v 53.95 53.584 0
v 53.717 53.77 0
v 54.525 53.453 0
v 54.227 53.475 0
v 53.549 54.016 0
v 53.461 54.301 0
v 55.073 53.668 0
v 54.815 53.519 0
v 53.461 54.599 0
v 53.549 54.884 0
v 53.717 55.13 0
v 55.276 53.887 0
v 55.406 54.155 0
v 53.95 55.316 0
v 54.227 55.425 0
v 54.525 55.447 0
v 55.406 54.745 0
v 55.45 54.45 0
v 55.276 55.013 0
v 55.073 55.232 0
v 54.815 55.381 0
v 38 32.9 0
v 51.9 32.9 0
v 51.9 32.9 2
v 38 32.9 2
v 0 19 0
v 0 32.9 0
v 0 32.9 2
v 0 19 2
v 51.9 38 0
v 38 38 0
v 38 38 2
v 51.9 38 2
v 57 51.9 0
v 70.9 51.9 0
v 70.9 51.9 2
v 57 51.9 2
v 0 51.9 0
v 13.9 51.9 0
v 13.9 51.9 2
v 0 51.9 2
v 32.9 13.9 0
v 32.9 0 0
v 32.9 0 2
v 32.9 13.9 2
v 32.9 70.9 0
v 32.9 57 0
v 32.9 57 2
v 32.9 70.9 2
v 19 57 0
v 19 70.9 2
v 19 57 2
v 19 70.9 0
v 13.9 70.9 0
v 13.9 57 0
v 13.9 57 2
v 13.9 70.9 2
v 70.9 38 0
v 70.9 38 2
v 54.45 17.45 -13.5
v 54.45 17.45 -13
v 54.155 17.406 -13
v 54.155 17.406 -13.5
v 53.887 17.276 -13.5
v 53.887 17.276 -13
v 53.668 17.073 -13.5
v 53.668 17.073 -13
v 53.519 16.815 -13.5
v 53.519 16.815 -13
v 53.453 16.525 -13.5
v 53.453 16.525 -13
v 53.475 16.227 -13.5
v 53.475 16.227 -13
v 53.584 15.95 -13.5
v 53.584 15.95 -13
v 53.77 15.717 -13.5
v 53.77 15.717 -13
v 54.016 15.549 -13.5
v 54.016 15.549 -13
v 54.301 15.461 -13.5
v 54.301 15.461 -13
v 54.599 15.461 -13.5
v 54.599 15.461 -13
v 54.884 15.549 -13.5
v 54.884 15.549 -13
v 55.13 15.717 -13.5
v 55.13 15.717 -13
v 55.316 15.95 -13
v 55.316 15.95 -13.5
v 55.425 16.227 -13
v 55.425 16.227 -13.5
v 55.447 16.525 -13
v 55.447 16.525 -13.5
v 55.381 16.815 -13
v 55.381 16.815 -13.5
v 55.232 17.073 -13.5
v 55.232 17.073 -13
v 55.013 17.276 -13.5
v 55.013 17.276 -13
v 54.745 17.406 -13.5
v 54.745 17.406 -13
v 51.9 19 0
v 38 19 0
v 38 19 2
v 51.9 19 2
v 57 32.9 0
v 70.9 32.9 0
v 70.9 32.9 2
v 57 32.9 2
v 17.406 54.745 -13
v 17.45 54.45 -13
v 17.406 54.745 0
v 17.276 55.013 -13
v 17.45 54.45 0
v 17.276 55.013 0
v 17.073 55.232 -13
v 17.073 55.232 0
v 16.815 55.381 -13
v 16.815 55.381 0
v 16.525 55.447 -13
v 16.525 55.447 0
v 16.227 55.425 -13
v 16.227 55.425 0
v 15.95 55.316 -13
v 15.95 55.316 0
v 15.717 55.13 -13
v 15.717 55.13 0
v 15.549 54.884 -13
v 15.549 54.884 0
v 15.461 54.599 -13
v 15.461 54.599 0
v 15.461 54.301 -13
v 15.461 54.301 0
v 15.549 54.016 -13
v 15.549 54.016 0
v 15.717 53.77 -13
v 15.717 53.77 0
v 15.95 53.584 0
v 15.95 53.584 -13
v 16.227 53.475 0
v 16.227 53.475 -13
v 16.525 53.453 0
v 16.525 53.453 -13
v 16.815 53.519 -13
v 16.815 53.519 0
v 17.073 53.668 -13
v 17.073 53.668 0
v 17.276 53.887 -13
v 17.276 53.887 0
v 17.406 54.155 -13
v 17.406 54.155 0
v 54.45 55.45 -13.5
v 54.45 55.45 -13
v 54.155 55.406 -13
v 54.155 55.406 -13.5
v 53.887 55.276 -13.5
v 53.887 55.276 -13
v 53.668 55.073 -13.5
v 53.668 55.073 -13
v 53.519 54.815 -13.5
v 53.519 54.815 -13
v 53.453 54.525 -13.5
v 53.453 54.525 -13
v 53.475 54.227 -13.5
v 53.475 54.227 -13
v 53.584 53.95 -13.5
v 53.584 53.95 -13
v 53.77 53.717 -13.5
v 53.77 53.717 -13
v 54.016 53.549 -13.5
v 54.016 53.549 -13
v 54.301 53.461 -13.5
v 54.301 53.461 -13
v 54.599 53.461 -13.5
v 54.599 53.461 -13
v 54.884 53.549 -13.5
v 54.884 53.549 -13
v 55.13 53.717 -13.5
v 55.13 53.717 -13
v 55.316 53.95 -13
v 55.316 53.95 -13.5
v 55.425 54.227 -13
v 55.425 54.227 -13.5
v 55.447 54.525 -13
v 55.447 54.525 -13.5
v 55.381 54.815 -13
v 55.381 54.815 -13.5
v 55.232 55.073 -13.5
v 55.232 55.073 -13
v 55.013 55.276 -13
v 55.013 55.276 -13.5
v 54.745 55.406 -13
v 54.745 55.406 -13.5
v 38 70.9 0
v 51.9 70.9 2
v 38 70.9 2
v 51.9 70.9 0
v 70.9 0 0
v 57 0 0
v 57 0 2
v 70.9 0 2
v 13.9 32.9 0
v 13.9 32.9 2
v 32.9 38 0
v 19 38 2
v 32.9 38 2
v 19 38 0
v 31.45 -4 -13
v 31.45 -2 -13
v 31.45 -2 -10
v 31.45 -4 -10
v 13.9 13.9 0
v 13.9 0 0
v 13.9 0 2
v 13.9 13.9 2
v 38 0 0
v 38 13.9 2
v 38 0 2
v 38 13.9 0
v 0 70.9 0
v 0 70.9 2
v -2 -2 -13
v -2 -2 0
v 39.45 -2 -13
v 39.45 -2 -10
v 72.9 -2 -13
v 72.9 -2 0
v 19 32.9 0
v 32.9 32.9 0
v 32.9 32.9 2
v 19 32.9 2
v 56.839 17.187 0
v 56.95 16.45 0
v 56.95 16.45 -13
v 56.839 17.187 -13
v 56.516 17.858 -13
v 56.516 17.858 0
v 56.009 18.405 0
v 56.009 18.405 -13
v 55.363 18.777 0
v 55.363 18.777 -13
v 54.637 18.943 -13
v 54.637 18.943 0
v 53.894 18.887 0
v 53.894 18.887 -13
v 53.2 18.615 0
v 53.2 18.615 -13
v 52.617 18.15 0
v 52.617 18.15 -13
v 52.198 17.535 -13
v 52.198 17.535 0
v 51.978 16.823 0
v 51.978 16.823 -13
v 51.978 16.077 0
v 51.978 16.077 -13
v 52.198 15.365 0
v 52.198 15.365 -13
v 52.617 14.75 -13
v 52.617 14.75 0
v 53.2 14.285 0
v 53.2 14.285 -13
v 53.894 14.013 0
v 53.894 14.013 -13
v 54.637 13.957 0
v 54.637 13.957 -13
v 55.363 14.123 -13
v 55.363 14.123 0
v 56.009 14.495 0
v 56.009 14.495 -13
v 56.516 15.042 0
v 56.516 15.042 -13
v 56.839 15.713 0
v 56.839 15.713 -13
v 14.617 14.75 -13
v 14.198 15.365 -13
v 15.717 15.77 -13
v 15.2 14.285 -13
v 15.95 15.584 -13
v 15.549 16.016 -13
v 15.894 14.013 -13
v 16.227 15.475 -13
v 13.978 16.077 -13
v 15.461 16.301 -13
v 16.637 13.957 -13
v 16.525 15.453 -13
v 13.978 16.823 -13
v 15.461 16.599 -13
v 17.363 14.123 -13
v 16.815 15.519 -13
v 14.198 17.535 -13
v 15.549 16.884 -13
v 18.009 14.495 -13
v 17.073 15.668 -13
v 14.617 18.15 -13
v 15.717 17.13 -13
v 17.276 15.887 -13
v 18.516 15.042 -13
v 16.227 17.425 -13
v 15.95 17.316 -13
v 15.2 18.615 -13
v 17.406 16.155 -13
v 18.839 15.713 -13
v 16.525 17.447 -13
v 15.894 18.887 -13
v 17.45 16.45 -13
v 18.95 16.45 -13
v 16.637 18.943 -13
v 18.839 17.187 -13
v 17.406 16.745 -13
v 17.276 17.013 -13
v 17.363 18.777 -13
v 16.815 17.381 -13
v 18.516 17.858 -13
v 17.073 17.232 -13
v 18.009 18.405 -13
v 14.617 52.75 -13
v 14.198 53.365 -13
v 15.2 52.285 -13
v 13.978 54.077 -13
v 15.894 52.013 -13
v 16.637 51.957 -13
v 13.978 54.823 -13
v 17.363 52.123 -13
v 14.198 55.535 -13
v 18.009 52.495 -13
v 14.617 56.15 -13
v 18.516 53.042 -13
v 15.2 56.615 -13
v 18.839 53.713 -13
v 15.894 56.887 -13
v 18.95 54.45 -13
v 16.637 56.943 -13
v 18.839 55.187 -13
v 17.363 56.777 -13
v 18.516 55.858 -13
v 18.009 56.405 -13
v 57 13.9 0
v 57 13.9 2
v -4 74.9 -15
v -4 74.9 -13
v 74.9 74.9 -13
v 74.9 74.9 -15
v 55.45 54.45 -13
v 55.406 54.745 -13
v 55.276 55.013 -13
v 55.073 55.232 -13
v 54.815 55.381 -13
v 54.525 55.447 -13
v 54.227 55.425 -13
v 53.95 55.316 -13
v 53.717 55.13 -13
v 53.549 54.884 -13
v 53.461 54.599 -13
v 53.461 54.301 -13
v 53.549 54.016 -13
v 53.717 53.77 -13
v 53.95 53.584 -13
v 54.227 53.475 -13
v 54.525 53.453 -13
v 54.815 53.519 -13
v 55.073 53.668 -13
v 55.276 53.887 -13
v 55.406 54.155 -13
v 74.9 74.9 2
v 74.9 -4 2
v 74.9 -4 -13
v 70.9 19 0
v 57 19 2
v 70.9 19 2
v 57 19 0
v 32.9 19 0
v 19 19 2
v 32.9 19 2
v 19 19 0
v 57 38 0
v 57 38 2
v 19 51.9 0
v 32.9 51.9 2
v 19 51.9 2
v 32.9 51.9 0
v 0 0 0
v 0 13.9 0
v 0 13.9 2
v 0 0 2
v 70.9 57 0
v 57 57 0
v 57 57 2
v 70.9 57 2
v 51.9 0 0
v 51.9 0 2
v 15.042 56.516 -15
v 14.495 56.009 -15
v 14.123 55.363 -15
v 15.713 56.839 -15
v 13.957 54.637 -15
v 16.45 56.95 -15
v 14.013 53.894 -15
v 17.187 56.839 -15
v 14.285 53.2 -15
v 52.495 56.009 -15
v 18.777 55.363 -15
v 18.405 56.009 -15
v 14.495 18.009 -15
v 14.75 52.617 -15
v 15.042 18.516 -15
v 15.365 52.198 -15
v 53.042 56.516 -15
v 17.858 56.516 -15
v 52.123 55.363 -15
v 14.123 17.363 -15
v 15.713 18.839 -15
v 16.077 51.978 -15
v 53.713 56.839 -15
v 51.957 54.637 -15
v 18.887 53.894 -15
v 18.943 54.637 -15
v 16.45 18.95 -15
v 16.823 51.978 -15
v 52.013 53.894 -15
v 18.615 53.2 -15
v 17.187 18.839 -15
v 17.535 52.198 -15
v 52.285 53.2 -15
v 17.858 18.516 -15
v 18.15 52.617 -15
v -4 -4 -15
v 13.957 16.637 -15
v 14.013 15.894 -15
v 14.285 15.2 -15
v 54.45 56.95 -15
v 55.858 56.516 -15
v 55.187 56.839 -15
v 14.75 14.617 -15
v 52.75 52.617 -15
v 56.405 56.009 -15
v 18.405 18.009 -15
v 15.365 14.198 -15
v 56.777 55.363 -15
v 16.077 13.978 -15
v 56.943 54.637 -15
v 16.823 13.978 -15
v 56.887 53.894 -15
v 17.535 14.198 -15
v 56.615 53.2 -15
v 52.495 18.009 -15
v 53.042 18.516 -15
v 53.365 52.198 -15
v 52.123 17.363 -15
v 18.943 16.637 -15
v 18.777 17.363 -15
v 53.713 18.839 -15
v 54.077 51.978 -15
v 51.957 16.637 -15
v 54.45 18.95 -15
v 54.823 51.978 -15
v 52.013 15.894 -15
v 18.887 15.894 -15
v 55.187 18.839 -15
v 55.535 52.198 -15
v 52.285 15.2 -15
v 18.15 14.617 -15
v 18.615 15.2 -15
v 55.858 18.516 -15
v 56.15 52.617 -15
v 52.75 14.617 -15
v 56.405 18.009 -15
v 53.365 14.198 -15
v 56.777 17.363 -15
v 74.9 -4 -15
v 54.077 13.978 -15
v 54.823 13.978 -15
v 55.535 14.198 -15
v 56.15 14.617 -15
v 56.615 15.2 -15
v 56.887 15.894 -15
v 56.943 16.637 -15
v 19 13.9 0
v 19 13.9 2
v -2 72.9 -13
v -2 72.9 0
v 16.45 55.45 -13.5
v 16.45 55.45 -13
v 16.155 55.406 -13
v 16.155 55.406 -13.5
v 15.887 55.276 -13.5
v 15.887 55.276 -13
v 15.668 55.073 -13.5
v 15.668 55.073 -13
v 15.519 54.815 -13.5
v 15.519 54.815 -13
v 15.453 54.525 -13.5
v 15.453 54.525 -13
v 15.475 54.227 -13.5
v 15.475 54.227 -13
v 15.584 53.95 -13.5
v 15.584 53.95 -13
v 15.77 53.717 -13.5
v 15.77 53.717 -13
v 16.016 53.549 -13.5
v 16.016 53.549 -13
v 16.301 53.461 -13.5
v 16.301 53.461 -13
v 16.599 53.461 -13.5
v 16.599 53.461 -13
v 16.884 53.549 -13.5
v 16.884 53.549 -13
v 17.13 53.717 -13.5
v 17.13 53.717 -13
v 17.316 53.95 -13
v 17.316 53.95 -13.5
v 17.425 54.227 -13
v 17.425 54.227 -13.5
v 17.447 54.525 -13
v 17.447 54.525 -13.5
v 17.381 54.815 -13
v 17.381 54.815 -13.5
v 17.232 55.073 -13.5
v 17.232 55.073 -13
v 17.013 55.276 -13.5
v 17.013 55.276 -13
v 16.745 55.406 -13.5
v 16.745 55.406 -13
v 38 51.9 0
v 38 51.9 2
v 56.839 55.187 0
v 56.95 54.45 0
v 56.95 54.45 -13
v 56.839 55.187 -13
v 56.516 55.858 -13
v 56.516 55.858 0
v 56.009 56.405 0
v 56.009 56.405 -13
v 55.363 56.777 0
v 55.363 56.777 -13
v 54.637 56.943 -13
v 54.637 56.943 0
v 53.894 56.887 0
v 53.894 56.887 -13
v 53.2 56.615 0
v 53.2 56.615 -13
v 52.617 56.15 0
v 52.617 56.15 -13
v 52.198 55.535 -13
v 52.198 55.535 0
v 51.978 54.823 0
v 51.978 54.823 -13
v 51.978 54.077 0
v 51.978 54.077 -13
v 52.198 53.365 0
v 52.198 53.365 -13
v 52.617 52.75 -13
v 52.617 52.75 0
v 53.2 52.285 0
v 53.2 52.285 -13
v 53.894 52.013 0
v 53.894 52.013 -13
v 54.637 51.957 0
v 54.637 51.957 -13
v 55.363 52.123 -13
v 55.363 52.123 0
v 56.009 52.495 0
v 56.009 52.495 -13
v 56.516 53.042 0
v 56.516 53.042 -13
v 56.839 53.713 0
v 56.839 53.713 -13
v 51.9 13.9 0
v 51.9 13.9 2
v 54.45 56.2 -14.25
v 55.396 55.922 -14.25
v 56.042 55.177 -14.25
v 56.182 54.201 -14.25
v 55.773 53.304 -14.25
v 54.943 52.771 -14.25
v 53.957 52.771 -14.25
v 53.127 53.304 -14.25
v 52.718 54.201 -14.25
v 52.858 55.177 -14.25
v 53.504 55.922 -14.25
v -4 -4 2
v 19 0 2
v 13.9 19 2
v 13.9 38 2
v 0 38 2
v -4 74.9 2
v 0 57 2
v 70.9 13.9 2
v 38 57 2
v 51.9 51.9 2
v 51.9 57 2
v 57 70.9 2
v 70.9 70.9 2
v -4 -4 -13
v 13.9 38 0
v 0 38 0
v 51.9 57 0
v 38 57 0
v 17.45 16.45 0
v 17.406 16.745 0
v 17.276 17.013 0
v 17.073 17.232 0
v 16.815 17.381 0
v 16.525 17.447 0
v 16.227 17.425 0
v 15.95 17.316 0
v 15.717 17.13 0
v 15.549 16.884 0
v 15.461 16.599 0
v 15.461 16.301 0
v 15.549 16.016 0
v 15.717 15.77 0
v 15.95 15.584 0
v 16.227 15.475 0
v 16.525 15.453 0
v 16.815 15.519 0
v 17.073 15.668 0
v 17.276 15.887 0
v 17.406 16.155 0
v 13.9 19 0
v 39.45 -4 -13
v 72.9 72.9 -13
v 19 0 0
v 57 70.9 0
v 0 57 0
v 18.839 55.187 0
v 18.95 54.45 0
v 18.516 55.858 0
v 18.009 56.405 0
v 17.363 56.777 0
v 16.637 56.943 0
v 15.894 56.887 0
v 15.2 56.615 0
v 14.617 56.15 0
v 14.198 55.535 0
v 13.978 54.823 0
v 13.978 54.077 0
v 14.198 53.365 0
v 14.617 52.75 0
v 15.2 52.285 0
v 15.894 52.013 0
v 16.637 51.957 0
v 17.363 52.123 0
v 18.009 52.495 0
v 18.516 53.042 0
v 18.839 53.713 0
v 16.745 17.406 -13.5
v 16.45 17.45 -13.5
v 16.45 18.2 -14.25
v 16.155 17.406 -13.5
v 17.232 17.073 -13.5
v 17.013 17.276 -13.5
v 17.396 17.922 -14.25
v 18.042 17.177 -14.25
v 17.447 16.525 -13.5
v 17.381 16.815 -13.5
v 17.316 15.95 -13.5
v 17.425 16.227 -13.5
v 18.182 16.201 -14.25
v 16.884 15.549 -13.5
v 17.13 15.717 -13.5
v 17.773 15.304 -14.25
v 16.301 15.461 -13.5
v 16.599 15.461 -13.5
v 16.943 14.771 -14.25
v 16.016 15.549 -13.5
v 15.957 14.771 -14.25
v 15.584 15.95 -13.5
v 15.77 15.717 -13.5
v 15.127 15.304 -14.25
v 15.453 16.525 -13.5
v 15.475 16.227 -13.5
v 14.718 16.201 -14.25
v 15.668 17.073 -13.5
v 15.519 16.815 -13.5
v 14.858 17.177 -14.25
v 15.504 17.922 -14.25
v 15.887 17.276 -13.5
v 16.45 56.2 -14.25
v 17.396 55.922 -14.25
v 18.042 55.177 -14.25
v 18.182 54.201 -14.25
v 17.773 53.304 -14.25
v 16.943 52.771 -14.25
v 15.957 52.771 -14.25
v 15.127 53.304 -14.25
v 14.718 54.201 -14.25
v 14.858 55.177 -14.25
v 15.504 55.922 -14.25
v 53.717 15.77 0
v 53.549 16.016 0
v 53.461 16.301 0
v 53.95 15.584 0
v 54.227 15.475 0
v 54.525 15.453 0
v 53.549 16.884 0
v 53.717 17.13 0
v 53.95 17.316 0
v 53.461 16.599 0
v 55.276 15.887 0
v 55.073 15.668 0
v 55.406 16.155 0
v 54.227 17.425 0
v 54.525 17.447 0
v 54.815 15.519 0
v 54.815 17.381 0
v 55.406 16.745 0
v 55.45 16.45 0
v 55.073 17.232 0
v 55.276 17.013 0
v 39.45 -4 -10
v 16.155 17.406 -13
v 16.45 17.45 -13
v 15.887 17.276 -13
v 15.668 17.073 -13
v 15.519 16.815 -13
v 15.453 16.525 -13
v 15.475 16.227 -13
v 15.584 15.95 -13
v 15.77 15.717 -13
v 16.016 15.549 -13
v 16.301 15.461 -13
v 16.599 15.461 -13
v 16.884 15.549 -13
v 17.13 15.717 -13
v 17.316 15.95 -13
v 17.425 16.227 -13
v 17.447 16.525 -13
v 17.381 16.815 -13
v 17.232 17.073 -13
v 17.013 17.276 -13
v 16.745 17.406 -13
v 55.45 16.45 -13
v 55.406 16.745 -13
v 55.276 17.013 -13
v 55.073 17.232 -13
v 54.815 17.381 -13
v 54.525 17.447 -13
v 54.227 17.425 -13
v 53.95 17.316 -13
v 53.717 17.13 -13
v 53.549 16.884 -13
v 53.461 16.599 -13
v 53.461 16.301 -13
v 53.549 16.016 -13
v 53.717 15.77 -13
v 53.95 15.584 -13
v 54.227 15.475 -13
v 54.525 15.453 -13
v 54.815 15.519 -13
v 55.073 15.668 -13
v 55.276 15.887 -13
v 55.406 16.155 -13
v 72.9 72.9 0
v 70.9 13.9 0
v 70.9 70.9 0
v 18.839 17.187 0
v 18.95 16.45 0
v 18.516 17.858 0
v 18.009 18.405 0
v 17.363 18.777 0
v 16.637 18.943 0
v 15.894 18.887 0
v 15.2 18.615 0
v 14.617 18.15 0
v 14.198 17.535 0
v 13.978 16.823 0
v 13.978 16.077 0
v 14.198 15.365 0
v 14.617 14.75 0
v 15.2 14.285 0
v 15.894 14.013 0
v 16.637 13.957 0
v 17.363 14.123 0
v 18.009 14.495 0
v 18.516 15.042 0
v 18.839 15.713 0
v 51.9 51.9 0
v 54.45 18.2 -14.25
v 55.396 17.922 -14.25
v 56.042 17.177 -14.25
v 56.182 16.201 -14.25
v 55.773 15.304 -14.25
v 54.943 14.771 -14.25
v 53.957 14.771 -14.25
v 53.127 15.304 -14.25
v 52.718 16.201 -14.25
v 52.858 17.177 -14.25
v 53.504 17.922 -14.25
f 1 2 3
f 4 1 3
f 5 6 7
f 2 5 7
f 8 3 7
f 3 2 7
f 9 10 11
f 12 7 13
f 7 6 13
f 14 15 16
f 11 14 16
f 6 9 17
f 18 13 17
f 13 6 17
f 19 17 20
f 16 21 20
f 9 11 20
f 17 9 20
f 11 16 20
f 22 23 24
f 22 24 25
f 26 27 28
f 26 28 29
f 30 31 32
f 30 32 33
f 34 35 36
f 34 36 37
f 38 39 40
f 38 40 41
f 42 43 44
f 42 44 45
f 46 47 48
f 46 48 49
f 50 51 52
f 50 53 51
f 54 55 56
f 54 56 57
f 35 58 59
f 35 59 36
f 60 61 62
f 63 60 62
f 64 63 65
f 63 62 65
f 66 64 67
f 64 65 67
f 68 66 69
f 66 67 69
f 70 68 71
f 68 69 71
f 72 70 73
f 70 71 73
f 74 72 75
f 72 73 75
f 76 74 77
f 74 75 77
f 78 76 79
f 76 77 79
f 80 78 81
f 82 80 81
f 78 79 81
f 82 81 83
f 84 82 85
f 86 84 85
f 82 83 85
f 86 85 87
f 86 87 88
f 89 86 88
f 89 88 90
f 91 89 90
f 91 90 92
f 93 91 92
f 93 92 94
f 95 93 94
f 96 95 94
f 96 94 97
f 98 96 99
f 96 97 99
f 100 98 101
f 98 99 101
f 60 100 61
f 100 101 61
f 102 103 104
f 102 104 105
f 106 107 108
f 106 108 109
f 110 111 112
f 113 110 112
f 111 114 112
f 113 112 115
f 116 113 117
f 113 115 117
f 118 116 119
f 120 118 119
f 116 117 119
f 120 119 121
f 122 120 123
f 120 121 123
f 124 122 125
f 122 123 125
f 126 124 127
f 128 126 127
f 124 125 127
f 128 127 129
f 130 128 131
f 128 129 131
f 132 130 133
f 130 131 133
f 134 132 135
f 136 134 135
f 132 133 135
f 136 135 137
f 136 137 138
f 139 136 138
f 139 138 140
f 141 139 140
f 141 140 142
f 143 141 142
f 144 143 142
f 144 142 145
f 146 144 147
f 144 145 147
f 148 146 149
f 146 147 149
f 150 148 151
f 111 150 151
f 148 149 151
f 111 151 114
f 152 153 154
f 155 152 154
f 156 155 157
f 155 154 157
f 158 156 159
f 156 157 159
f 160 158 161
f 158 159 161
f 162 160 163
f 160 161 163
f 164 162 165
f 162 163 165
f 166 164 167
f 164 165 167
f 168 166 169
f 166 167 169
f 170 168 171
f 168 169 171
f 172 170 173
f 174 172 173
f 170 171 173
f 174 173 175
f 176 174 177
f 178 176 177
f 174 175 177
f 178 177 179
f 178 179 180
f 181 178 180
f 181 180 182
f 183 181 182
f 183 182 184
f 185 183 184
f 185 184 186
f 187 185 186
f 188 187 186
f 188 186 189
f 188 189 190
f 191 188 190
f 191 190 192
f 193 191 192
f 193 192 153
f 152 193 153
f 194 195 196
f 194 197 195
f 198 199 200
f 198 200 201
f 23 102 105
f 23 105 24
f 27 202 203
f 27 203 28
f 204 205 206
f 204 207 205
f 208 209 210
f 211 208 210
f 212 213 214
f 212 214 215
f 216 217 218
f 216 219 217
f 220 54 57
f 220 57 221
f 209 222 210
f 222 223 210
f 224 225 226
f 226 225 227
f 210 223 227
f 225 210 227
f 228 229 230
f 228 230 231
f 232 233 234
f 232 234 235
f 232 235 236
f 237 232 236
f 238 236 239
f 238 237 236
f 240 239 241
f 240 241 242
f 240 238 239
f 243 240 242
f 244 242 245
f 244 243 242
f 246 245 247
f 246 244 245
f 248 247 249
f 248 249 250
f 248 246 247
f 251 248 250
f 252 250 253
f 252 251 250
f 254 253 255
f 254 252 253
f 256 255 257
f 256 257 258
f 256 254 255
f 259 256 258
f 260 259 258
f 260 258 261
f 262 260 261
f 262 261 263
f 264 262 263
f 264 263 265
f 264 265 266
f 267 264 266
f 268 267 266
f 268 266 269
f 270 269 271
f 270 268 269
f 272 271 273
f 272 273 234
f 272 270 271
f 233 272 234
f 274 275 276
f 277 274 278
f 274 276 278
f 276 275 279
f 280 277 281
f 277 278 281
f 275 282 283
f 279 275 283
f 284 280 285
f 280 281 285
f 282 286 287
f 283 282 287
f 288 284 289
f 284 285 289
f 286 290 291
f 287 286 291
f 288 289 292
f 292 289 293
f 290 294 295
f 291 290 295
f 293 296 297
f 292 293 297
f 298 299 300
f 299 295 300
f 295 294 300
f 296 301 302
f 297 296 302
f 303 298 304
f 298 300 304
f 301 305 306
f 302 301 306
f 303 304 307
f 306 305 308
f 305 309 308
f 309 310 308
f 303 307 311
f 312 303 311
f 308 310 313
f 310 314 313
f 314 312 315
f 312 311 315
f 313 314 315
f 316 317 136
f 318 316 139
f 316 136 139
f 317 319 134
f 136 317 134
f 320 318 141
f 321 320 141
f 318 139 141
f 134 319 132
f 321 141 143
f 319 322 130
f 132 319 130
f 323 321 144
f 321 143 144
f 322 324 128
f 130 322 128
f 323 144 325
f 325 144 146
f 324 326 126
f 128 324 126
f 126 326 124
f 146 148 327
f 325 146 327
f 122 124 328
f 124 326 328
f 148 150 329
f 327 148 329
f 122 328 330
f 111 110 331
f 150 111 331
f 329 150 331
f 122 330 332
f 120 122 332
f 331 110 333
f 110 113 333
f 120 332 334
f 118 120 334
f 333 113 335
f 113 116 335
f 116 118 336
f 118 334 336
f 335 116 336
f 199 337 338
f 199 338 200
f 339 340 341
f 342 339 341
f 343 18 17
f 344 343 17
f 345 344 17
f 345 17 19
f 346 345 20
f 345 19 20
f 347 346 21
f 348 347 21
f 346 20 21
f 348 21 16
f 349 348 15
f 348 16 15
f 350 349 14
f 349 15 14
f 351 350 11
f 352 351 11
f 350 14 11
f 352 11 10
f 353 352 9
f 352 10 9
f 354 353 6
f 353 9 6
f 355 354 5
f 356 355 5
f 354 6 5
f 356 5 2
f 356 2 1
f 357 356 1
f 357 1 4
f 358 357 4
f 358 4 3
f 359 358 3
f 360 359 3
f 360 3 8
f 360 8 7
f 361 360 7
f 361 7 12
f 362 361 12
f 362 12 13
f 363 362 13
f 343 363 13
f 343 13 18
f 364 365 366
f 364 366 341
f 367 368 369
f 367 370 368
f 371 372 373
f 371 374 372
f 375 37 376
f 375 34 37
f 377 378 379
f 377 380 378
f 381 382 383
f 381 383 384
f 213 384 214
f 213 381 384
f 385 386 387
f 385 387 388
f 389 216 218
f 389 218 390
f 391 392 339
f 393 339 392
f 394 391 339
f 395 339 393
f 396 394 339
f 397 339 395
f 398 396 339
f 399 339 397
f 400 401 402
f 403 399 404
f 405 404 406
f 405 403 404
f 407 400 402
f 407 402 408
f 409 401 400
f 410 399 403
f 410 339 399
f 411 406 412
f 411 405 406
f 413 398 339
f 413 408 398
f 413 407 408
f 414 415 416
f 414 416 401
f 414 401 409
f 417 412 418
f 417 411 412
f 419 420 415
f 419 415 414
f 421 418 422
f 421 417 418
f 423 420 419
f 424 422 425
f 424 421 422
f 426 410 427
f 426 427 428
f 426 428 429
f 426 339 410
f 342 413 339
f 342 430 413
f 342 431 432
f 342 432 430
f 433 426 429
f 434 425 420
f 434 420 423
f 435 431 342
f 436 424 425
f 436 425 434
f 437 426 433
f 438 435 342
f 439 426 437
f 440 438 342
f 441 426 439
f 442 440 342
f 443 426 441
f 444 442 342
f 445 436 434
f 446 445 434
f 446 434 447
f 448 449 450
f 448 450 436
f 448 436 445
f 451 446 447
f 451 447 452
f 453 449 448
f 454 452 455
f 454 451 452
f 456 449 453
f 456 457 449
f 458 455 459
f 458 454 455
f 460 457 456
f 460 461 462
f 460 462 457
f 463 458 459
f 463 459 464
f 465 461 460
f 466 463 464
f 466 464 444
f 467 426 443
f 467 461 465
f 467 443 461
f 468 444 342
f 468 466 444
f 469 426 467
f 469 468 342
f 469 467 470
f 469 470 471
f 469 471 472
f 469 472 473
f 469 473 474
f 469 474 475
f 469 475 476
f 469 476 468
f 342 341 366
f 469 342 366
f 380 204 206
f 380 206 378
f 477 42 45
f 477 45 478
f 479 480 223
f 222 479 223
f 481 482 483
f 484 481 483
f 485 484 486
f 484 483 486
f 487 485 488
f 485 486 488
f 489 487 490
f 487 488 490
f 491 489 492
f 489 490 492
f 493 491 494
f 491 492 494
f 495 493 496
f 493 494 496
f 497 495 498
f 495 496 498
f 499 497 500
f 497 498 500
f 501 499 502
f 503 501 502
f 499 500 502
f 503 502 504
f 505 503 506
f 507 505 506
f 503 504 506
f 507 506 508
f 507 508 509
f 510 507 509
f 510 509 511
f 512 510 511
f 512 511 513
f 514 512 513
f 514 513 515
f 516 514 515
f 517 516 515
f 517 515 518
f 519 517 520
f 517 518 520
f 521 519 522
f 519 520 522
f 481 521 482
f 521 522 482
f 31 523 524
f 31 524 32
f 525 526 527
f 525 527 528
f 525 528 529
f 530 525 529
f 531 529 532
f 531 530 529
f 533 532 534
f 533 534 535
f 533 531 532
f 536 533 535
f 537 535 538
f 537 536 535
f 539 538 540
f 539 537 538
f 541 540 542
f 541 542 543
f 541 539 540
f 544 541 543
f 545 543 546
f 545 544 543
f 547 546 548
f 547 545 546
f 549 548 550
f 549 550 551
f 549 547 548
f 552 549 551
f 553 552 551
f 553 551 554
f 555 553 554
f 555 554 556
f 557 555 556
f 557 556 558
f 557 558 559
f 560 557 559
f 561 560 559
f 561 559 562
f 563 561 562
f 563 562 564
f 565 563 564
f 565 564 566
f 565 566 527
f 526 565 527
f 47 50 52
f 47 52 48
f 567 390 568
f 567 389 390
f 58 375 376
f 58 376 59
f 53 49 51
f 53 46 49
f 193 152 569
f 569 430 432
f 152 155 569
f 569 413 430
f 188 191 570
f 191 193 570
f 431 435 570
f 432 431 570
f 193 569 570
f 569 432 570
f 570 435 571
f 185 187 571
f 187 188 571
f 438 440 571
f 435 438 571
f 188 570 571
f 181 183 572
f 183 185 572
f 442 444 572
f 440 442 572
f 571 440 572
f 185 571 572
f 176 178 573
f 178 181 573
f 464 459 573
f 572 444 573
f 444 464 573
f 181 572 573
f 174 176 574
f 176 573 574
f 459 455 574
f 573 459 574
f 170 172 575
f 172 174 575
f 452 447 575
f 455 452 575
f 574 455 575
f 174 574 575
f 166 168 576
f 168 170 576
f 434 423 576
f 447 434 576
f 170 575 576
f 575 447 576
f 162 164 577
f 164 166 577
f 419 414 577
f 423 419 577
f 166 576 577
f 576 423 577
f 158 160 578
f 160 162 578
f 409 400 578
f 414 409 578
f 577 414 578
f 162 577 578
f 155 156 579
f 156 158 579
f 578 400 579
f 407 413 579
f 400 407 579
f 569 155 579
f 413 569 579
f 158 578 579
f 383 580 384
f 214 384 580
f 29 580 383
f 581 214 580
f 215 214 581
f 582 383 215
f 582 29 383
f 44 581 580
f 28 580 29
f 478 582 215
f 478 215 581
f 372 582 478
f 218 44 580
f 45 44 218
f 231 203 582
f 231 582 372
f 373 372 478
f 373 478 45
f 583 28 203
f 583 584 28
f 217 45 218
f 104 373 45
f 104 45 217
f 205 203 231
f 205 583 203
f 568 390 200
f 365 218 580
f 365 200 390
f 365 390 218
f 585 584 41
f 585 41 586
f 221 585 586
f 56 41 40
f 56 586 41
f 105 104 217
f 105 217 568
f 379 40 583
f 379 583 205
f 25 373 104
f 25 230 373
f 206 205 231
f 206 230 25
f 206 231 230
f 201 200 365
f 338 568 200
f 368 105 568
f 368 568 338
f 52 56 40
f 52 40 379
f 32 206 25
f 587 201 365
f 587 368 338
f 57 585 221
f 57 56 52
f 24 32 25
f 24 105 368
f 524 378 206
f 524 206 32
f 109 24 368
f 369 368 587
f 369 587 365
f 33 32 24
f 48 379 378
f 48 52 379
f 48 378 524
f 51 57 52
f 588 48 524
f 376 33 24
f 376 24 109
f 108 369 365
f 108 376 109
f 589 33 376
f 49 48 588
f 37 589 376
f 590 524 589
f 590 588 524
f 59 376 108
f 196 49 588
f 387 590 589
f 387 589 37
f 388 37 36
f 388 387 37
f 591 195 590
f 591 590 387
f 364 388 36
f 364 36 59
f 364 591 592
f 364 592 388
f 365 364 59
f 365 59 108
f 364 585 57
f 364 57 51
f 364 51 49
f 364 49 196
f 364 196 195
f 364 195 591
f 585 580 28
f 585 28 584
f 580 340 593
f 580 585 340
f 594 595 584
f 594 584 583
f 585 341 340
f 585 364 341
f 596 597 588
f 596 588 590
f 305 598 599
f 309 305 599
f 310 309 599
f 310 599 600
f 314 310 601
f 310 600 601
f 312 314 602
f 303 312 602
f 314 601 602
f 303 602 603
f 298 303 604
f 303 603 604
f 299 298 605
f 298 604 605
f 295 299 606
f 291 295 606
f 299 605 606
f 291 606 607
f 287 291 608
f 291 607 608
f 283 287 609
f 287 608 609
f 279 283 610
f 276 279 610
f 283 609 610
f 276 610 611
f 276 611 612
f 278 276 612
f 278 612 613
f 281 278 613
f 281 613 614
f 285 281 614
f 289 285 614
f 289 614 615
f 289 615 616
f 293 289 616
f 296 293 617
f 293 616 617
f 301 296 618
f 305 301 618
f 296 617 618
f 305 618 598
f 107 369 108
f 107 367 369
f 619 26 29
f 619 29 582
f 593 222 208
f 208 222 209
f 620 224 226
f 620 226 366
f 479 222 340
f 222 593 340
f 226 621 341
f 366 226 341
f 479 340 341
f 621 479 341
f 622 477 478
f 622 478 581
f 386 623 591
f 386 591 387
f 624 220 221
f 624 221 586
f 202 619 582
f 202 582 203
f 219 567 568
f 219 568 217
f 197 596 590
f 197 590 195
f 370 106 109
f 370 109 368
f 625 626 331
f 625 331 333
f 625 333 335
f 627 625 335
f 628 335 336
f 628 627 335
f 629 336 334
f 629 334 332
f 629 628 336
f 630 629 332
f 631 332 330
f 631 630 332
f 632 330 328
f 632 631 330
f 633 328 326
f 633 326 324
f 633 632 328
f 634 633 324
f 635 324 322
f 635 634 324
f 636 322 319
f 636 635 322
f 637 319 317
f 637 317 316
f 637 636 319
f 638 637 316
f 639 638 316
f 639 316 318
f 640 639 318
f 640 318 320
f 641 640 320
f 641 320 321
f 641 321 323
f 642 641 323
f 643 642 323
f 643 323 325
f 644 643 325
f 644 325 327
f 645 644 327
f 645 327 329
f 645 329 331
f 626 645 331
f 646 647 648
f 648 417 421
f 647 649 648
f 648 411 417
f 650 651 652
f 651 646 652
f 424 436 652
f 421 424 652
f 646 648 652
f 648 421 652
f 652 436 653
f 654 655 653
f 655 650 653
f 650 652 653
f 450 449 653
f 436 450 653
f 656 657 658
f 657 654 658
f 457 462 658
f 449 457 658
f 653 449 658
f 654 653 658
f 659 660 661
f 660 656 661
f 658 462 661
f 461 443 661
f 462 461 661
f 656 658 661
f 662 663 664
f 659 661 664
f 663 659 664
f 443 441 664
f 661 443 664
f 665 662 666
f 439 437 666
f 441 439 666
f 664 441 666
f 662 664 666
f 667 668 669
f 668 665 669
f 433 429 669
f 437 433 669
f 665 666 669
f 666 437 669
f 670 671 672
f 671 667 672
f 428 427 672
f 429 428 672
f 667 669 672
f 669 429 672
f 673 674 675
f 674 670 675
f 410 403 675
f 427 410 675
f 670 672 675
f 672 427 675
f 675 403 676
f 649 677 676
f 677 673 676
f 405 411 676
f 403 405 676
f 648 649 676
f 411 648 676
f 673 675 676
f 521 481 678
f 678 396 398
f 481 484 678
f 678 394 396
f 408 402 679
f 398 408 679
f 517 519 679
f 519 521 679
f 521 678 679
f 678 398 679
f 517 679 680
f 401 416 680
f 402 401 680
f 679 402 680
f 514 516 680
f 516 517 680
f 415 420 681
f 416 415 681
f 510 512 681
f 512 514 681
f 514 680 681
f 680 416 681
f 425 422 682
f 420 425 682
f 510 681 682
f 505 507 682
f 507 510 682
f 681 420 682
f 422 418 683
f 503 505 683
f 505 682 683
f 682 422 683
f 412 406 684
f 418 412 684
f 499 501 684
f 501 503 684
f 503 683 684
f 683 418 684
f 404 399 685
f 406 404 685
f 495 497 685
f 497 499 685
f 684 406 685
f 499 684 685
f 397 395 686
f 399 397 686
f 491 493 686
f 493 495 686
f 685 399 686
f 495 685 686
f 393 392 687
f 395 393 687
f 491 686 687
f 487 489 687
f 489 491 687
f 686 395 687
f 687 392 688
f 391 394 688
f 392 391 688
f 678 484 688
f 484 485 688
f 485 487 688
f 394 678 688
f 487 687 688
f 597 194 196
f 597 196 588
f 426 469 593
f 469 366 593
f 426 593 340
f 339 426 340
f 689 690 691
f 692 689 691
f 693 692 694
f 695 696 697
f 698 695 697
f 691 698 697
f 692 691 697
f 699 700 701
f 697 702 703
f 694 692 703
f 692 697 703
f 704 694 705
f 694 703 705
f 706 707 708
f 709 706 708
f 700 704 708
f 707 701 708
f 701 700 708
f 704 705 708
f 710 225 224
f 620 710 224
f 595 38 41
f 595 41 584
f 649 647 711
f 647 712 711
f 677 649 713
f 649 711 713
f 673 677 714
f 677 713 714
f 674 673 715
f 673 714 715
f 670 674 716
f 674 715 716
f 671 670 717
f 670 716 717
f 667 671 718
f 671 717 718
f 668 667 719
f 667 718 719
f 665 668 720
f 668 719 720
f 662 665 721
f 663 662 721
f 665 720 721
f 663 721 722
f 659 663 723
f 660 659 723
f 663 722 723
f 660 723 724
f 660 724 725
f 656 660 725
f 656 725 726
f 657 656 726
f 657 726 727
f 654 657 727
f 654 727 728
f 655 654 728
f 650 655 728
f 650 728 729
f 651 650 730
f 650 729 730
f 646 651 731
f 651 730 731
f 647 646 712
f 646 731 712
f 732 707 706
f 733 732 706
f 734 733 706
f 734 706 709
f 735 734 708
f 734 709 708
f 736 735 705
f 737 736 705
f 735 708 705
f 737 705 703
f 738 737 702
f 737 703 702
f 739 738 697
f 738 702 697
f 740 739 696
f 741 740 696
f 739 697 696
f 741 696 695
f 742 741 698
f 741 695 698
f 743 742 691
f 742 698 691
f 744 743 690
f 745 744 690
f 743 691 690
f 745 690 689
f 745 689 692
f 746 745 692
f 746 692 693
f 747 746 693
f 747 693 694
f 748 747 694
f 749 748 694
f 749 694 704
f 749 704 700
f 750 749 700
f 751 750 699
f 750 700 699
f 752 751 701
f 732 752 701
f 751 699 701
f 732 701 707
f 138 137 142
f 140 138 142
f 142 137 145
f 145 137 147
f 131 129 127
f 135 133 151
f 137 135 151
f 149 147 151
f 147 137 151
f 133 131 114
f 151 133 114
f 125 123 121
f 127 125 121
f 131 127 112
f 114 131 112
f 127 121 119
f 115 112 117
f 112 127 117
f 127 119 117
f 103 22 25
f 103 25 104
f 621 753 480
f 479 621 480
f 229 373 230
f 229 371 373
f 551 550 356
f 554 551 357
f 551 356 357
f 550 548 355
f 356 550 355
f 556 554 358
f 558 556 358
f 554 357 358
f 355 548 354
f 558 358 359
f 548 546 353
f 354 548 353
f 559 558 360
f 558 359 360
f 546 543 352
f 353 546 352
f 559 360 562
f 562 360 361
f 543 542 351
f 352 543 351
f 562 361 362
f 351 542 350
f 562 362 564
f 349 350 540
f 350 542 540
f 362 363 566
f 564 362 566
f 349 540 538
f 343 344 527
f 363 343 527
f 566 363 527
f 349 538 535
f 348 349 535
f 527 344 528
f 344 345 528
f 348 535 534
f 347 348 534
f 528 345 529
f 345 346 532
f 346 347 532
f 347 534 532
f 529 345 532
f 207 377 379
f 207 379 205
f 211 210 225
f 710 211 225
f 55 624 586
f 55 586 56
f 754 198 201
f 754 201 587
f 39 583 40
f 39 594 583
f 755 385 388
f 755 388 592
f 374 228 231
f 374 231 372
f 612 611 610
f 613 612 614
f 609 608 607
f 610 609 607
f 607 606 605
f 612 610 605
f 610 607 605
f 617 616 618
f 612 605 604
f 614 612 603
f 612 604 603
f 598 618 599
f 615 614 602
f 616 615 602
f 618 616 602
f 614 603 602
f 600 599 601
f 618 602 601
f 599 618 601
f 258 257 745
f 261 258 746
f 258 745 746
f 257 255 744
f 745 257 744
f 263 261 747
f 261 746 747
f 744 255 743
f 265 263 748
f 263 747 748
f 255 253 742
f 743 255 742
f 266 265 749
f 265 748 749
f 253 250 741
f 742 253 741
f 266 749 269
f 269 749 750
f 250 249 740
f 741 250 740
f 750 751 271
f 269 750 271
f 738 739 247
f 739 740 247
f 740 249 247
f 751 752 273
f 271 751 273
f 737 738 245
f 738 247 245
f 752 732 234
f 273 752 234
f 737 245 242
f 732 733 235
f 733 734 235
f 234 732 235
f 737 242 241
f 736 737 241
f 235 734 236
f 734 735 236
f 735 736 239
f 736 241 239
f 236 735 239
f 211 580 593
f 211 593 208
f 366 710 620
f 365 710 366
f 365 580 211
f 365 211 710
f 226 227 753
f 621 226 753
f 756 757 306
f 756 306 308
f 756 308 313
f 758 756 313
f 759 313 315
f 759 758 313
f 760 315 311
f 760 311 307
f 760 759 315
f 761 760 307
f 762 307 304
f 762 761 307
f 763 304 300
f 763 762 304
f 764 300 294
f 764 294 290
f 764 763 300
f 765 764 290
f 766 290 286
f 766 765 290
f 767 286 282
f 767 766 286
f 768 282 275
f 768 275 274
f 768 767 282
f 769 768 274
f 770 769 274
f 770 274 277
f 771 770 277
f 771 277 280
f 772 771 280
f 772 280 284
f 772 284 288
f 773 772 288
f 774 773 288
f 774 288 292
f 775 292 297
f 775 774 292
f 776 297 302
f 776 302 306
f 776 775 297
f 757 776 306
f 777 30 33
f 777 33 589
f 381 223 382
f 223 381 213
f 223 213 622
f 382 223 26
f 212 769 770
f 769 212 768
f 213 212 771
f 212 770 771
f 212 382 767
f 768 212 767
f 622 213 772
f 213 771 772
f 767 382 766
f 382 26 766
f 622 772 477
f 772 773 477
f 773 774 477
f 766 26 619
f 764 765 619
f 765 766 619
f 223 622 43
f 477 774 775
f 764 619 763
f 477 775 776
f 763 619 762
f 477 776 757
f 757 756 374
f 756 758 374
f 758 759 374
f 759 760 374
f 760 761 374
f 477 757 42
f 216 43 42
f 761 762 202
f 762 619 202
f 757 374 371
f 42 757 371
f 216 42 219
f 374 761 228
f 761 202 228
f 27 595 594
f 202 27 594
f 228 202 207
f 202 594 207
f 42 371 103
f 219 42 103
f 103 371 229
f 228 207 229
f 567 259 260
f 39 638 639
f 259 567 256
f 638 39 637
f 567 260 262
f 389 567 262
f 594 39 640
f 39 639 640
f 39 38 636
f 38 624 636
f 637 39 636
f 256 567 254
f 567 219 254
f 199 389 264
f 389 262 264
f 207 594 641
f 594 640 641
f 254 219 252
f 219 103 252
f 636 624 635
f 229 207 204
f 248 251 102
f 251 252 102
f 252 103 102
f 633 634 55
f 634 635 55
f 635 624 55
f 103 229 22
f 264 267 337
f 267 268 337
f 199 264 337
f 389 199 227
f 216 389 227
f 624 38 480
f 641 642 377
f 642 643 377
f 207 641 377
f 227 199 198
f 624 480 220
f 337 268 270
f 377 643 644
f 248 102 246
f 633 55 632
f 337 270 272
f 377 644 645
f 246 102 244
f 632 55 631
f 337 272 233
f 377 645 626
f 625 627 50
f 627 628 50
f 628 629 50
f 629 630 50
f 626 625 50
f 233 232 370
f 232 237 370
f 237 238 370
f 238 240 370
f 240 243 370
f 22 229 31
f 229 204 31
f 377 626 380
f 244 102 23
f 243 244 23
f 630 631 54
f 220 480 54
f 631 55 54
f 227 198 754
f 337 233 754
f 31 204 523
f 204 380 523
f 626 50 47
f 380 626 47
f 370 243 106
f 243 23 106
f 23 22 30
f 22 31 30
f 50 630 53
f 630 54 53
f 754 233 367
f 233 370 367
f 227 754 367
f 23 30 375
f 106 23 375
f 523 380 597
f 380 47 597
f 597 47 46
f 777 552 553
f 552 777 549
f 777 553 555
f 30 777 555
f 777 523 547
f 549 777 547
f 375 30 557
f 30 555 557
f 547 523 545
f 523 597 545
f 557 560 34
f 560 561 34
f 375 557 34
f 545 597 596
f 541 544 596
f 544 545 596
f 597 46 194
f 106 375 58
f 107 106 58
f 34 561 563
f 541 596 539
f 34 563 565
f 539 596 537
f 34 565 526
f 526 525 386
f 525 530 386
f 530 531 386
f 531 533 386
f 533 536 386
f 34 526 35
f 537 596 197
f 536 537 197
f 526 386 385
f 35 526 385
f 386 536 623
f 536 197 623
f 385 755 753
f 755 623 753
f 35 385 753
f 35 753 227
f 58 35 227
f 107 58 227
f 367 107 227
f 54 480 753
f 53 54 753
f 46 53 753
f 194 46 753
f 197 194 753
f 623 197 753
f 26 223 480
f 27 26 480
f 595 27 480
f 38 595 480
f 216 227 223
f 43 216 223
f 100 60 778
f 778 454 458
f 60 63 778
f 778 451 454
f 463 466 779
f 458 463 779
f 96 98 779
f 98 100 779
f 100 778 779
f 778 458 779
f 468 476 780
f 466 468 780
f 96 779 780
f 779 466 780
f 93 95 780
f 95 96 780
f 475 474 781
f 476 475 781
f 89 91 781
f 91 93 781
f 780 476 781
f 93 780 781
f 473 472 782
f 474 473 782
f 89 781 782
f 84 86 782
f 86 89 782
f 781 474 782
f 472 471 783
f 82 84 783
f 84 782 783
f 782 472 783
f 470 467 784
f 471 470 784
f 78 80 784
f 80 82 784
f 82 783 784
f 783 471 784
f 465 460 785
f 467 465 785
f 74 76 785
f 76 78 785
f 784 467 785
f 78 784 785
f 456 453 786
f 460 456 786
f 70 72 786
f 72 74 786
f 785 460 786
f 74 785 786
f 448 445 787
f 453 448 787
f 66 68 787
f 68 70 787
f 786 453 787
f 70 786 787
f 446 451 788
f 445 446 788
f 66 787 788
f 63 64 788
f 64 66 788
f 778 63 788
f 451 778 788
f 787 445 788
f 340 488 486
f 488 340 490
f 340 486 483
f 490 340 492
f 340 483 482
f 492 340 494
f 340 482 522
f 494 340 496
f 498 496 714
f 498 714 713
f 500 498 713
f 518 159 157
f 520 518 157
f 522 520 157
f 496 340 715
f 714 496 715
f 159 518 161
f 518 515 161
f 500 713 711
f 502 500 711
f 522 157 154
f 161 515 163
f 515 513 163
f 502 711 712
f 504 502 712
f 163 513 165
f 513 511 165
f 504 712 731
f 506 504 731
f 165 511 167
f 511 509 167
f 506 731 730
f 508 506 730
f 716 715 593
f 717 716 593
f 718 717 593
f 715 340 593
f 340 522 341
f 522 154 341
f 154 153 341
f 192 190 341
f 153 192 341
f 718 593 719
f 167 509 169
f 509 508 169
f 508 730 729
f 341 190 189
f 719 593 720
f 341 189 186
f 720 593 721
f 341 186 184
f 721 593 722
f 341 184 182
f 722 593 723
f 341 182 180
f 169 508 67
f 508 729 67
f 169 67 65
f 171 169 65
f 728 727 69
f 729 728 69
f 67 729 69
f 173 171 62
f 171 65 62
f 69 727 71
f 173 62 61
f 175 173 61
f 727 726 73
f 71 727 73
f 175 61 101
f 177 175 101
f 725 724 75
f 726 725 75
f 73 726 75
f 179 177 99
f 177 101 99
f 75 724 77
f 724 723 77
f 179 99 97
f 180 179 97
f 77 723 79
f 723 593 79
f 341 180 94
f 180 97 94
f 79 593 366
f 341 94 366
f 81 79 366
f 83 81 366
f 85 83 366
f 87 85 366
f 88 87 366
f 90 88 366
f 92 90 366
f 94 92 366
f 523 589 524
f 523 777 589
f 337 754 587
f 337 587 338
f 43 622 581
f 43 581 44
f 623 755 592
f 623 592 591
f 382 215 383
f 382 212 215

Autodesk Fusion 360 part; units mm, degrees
sketch "Sketch1" plane through (0, 0, 0) normal (0, 0, 1) x (1, 0, 0)
  line L0 (-4, -4) -> (74.9, -4)
  line L1 (74.9, -4) -> (74.9, 74.9)
  line L2 (74.9, 74.9) -> (-4, 74.9)
  line L3 (-4, 74.9) -> (-4, -4)
  line L4 (0, 0) -> (13.9, 0)
  line L5 (13.9, 0) -> (13.9, 13.9)
  line L6 (13.9, 13.9) -> (0, 13.9)
  line L7 (0, 13.9) -> (0, 0)
  line L8 (19, 13.9) -> (19, 0)
  line L9 (32.9, 13.9) -> (19, 13.9)
  line L10 (32.9, 0) -> (32.9, 13.9)
  line L11 (19, 0) -> (32.9, 0)
  line L12 (38, 13.9) -> (38, 0)
  line L13 (51.9, 13.9) -> (38, 13.9)
  line L14 (51.9, 0) -> (51.9, 13.9)
  line L15 (38, 0) -> (51.9, 0)
  line L16 (57, 13.9) -> (57, 0)
  line L17 (70.9, 13.9) -> (57, 13.9)
  line L18 (70.9, 0) -> (70.9, 13.9)
  line L19 (57, 0) -> (70.9, 0)
  line L20 (0, 32.9) -> (0, 19)
  line L21 (13.9, 32.9) -> (0, 32.9)
  line L22 (13.9, 19) -> (13.9, 32.9)
  line L23 (0, 19) -> (13.9, 19)
  line L24 (19, 32.9) -> (19, 19)
  line L25 (32.9, 32.9) -> (19, 32.9)
  line L26 (32.9, 19) -> (32.9, 32.9)
  line L27 (19, 19) -> (32.9, 19)
  line L28 (38, 32.9) -> (38, 19)
  line L29 (51.9, 32.9) -> (38, 32.9)
  line L30 (51.9, 19) -> (51.9, 32.9)
  line L31 (38, 19) -> (51.9, 19)
  line L32 (57, 32.9) -> (57, 19)
  line L33 (70.9, 32.9) -> (57, 32.9)
  line L34 (70.9, 19) -> (70.9, 32.9)
  line L35 (57, 19) -> (70.9, 19)
  line L36 (0, 51.9) -> (0, 38)
  line L37 (13.9, 51.9) -> (0, 51.9)
  line L38 (13.9, 38) -> (13.9, 51.9)
  line L39 (0, 38) -> (13.9, 38)
  line L40 (19, 51.9) -> (19, 38)
  line L41 (32.9, 51.9) -> (19, 51.9)
  line L42 (32.9, 38) -> (32.9, 51.9)
  line L43 (19, 38) -> (32.9, 38)
  line L44 (38, 51.9) -> (38, 38)
  line L45 (51.9, 51.9) -> (38, 51.9)
  line L46 (51.9, 38) -> (51.9, 51.9)
  line L47 (38, 38) -> (51.9, 38)
  line L48 (57, 51.9) -> (57, 38)
  line L49 (70.9, 51.9) -> (57, 51.9)
  line L50 (70.9, 38) -> (70.9, 51.9)
  line L51 (57, 38) -> (70.9, 38)
  line L52 (0, 70.9) -> (0, 57)
  line L53 (13.9, 70.9) -> (0, 70.9)
  line L54 (13.9, 57) -> (13.9, 70.9)
  line L55 (0, 57) -> (13.9, 57)
  line L56 (19, 70.9) -> (19, 57)
  line L57 (32.9, 70.9) -> (19, 70.9)
  line L58 (32.9, 57) -> (32.9, 70.9)
  line L59 (19, 57) -> (32.9, 57)
  line L60 (38, 70.9) -> (38, 57)
  line L61 (51.9, 70.9) -> (38, 70.9)
  line L62 (51.9, 57) -> (51.9, 70.9)
  line L63 (38, 57) -> (51.9, 57)
  line L64 (57, 70.9) -> (57, 57)
  line L65 (70.9, 70.9) -> (57, 70.9)
  line L66 (70.9, 57) -> (70.9, 70.9)
  line L67 (57, 57) -> (70.9, 57)
  line L68 (-2, -2) -> (72.9, -2)
  line L69 (72.9, -2) -> (72.9, 72.9)
  line L70 (72.9, 72.9) -> (-2, 72.9)
  line L71 (-2, 72.9) -> (-2, -2)
  line L72 (0, 0) -> (70.9, 70.9) construction
  line L73 (0, 70.9) -> (70.9, 0) construction
  line L74 (13.9, 51.9) -> (19, 57) construction
  line L75 (51.9, 57) -> (57, 51.9) construction
  line L76 (57, 19) -> (51.9, 13.9) construction
  line L77 (19, 13.9) -> (13.9, 19) construction
  circle A0 centre (16.45, 16.45) radius 2.5
  circle A1 centre (54.45, 16.45) radius 2.5
  circle A2 centre (54.45, 54.45) radius 2.5
  circle A3 centre (16.45, 54.45) radius 2.5
  circle A4 centre (16.45, 16.45) radius 1
  circle A5 centre (54.45, 16.45) radius 1
  circle A6 centre (54.45, 54.45) radius 1
  circle A7 centre (16.45, 54.45) radius 1
  dimension "d1" = 13.9
  dimension "d4" = 19
  dimension "d5" = 19
  dimension "d6" = 4
  dimension "d7" = 4
  dimension "d8" = 4
  dimension "d9" = 4
  dimension "d12" = 2
  dimension "d13" = 2
  dimension "d14" = 2
  dimension "d15" = 2
  dimension "d18" = 5
  dimension "d19" = 2
extrude "Extrude1" add sketch "Sketch1" along normal blind 2 contours L0 L1 L2 L3 | L68 L69 L70 L71 | A0 | A1 | A2 | A3 | A4 | A5 | A6 | A7 makes body 1
extrude "Extrude2" add sketch "Sketch1" against normal blind 13 contours L0 L1 L2 L3 bodies 1
extrude "Extrude3" add sketch "Sketch1" against normal up to surface (13 mm away) contours A0 | A1 | A2 | A3 bodies 1
sketch "Sketch2" plane through (0, -2, 0) normal (0, 1, 0) x (-1, 0, 0)
  line L0 (2, 0) -> (-72.9, 0)
  line L1 (-72.9, 0) -> (-72.9, -13)
  line L2 (-72.9, -13) -> (2, -13)
  line L3 (2, -13) -> (2, 0)
  line L4 (-39.45, -13) -> (-31.45, -13)
  line L5 (-31.45, -13) -> (-31.45, -10)
  line L6 (-31.45, -10) -> (-39.45, -10)
  line L7 (-39.45, -10) -> (-39.45, -13)
  line L8 (-74.9, -13) -> (4, 2) construction
  line L9 (-35.45, -5.5) -> (-35.45, -10) construction
  point P0 (4, 2)
  point P1 (-74.9, -13)
  dimension "d22" = 8
  dimension "d23" = 3
extrude "Extrude4" cut sketch "Sketch2" against normal blind 5 contours L2 L4 L5 L6 L7 bodies 1
sketch "Sketch1 (2)" plane through (0, 0, -13) normal (0, 0, -1) x (1, 0, 0) in component "Component"
  line L0 (39.45, 4) -> (39.45, 2)
  line L1 (39.45, 2) -> (72.9, 2)
  line L2 (72.9, 2) -> (72.9, -72.9)
  line L3 (72.9, -72.9) -> (-2, -72.9)
  line L4 (-2, -72.9) -> (-2, 2)
  line L5 (-2, 2) -> (31.45, 2)
  line L6 (31.45, 2) -> (31.45, 4)
  line L7 (31.45, 4) -> (-4, 4)
  line L8 (-4, 4) -> (-4, -74.9)
  line L9 (-4, -74.9) -> (74.9, -74.9)
  line L10 (74.9, -74.9) -> (74.9, 4)
  line L11 (74.9, 4) -> (39.45, 4)
  line L12 (-4, 4) -> (74.9, 4)
  line L13 (74.9, 4) -> (74.9, -74.9)
  line L14 (74.9, -74.9) -> (-4, -74.9)
  line L15 (-4, -74.9) -> (-4, 4)
  circle A0 centre (16.45, -16.45) radius 1 construction
  circle A1 centre (54.45, -16.45) radius 1 construction
  circle A2 centre (54.45, -54.45) radius 1 construction
  circle A3 centre (16.45, -54.45) radius 1 construction
  circle A4 centre (16.45, -16.45) radius 2.5 construction
  circle A5 centre (54.45, -16.45) radius 2.5 construction
  circle A6 centre (54.45, -54.45) radius 2.5 construction
  circle A7 centre (16.45, -54.45) radius 2.5 construction
  circle A8 centre (16.45, -16.45) radius 1 construction
extrude "Extrude1'" add sketch "Sketch1 (2)" along normal blind 2 separate body makes body 2 in component "Component"
sketch "Sketch2 (2)" plane through (0, 0, -15) normal (0, 0, -1) x (1, 0, 0) in component "Component"
  line L0 (-4, -74.9) -> (74.9, -74.9)
  line L1 (74.9, -74.9) -> (74.9, 4)
  line L2 (74.9, 4) -> (-4, 4)
  line L3 (-4, 4) -> (-4, -74.9)
  circle A0 centre (16.45, -16.45) radius 2.5634 construction
  circle A1 centre (54.45, -16.45) radius 1.0382 construction
  circle A2 centre (54.45, -54.45) radius 4.154 construction
  circle A3 centre (16.45, -54.45) radius 3.4752 construction
  circle A4 centre (16.45, -54.45) radius 1 construction
  circle A5 centre (54.45, -54.45) radius 1 construction
  circle A6 centre (54.45, -16.45) radius 1 construction
  circle A7 centre (16.45, -16.45) radius 1 construction
hole "Hole1" at (16.45, 16.45, -15) at (54.45, 16.45, -15) at (54.45, 54.45, -15) at (16.45, 54.45, -15) direction (0, 0, 1) diameter 2 depth 4 tip angle 118 countersink diameter 5 countersink angle 90 bodies 2 in component "Component"
component "Component" placed x (1, 0, 0) y (0, 1, 0) z (0, 0, 1) at (0, 0, 0)
equation "d6 = d7"
equation "d8 = d7"
equation "d9 = d7"
